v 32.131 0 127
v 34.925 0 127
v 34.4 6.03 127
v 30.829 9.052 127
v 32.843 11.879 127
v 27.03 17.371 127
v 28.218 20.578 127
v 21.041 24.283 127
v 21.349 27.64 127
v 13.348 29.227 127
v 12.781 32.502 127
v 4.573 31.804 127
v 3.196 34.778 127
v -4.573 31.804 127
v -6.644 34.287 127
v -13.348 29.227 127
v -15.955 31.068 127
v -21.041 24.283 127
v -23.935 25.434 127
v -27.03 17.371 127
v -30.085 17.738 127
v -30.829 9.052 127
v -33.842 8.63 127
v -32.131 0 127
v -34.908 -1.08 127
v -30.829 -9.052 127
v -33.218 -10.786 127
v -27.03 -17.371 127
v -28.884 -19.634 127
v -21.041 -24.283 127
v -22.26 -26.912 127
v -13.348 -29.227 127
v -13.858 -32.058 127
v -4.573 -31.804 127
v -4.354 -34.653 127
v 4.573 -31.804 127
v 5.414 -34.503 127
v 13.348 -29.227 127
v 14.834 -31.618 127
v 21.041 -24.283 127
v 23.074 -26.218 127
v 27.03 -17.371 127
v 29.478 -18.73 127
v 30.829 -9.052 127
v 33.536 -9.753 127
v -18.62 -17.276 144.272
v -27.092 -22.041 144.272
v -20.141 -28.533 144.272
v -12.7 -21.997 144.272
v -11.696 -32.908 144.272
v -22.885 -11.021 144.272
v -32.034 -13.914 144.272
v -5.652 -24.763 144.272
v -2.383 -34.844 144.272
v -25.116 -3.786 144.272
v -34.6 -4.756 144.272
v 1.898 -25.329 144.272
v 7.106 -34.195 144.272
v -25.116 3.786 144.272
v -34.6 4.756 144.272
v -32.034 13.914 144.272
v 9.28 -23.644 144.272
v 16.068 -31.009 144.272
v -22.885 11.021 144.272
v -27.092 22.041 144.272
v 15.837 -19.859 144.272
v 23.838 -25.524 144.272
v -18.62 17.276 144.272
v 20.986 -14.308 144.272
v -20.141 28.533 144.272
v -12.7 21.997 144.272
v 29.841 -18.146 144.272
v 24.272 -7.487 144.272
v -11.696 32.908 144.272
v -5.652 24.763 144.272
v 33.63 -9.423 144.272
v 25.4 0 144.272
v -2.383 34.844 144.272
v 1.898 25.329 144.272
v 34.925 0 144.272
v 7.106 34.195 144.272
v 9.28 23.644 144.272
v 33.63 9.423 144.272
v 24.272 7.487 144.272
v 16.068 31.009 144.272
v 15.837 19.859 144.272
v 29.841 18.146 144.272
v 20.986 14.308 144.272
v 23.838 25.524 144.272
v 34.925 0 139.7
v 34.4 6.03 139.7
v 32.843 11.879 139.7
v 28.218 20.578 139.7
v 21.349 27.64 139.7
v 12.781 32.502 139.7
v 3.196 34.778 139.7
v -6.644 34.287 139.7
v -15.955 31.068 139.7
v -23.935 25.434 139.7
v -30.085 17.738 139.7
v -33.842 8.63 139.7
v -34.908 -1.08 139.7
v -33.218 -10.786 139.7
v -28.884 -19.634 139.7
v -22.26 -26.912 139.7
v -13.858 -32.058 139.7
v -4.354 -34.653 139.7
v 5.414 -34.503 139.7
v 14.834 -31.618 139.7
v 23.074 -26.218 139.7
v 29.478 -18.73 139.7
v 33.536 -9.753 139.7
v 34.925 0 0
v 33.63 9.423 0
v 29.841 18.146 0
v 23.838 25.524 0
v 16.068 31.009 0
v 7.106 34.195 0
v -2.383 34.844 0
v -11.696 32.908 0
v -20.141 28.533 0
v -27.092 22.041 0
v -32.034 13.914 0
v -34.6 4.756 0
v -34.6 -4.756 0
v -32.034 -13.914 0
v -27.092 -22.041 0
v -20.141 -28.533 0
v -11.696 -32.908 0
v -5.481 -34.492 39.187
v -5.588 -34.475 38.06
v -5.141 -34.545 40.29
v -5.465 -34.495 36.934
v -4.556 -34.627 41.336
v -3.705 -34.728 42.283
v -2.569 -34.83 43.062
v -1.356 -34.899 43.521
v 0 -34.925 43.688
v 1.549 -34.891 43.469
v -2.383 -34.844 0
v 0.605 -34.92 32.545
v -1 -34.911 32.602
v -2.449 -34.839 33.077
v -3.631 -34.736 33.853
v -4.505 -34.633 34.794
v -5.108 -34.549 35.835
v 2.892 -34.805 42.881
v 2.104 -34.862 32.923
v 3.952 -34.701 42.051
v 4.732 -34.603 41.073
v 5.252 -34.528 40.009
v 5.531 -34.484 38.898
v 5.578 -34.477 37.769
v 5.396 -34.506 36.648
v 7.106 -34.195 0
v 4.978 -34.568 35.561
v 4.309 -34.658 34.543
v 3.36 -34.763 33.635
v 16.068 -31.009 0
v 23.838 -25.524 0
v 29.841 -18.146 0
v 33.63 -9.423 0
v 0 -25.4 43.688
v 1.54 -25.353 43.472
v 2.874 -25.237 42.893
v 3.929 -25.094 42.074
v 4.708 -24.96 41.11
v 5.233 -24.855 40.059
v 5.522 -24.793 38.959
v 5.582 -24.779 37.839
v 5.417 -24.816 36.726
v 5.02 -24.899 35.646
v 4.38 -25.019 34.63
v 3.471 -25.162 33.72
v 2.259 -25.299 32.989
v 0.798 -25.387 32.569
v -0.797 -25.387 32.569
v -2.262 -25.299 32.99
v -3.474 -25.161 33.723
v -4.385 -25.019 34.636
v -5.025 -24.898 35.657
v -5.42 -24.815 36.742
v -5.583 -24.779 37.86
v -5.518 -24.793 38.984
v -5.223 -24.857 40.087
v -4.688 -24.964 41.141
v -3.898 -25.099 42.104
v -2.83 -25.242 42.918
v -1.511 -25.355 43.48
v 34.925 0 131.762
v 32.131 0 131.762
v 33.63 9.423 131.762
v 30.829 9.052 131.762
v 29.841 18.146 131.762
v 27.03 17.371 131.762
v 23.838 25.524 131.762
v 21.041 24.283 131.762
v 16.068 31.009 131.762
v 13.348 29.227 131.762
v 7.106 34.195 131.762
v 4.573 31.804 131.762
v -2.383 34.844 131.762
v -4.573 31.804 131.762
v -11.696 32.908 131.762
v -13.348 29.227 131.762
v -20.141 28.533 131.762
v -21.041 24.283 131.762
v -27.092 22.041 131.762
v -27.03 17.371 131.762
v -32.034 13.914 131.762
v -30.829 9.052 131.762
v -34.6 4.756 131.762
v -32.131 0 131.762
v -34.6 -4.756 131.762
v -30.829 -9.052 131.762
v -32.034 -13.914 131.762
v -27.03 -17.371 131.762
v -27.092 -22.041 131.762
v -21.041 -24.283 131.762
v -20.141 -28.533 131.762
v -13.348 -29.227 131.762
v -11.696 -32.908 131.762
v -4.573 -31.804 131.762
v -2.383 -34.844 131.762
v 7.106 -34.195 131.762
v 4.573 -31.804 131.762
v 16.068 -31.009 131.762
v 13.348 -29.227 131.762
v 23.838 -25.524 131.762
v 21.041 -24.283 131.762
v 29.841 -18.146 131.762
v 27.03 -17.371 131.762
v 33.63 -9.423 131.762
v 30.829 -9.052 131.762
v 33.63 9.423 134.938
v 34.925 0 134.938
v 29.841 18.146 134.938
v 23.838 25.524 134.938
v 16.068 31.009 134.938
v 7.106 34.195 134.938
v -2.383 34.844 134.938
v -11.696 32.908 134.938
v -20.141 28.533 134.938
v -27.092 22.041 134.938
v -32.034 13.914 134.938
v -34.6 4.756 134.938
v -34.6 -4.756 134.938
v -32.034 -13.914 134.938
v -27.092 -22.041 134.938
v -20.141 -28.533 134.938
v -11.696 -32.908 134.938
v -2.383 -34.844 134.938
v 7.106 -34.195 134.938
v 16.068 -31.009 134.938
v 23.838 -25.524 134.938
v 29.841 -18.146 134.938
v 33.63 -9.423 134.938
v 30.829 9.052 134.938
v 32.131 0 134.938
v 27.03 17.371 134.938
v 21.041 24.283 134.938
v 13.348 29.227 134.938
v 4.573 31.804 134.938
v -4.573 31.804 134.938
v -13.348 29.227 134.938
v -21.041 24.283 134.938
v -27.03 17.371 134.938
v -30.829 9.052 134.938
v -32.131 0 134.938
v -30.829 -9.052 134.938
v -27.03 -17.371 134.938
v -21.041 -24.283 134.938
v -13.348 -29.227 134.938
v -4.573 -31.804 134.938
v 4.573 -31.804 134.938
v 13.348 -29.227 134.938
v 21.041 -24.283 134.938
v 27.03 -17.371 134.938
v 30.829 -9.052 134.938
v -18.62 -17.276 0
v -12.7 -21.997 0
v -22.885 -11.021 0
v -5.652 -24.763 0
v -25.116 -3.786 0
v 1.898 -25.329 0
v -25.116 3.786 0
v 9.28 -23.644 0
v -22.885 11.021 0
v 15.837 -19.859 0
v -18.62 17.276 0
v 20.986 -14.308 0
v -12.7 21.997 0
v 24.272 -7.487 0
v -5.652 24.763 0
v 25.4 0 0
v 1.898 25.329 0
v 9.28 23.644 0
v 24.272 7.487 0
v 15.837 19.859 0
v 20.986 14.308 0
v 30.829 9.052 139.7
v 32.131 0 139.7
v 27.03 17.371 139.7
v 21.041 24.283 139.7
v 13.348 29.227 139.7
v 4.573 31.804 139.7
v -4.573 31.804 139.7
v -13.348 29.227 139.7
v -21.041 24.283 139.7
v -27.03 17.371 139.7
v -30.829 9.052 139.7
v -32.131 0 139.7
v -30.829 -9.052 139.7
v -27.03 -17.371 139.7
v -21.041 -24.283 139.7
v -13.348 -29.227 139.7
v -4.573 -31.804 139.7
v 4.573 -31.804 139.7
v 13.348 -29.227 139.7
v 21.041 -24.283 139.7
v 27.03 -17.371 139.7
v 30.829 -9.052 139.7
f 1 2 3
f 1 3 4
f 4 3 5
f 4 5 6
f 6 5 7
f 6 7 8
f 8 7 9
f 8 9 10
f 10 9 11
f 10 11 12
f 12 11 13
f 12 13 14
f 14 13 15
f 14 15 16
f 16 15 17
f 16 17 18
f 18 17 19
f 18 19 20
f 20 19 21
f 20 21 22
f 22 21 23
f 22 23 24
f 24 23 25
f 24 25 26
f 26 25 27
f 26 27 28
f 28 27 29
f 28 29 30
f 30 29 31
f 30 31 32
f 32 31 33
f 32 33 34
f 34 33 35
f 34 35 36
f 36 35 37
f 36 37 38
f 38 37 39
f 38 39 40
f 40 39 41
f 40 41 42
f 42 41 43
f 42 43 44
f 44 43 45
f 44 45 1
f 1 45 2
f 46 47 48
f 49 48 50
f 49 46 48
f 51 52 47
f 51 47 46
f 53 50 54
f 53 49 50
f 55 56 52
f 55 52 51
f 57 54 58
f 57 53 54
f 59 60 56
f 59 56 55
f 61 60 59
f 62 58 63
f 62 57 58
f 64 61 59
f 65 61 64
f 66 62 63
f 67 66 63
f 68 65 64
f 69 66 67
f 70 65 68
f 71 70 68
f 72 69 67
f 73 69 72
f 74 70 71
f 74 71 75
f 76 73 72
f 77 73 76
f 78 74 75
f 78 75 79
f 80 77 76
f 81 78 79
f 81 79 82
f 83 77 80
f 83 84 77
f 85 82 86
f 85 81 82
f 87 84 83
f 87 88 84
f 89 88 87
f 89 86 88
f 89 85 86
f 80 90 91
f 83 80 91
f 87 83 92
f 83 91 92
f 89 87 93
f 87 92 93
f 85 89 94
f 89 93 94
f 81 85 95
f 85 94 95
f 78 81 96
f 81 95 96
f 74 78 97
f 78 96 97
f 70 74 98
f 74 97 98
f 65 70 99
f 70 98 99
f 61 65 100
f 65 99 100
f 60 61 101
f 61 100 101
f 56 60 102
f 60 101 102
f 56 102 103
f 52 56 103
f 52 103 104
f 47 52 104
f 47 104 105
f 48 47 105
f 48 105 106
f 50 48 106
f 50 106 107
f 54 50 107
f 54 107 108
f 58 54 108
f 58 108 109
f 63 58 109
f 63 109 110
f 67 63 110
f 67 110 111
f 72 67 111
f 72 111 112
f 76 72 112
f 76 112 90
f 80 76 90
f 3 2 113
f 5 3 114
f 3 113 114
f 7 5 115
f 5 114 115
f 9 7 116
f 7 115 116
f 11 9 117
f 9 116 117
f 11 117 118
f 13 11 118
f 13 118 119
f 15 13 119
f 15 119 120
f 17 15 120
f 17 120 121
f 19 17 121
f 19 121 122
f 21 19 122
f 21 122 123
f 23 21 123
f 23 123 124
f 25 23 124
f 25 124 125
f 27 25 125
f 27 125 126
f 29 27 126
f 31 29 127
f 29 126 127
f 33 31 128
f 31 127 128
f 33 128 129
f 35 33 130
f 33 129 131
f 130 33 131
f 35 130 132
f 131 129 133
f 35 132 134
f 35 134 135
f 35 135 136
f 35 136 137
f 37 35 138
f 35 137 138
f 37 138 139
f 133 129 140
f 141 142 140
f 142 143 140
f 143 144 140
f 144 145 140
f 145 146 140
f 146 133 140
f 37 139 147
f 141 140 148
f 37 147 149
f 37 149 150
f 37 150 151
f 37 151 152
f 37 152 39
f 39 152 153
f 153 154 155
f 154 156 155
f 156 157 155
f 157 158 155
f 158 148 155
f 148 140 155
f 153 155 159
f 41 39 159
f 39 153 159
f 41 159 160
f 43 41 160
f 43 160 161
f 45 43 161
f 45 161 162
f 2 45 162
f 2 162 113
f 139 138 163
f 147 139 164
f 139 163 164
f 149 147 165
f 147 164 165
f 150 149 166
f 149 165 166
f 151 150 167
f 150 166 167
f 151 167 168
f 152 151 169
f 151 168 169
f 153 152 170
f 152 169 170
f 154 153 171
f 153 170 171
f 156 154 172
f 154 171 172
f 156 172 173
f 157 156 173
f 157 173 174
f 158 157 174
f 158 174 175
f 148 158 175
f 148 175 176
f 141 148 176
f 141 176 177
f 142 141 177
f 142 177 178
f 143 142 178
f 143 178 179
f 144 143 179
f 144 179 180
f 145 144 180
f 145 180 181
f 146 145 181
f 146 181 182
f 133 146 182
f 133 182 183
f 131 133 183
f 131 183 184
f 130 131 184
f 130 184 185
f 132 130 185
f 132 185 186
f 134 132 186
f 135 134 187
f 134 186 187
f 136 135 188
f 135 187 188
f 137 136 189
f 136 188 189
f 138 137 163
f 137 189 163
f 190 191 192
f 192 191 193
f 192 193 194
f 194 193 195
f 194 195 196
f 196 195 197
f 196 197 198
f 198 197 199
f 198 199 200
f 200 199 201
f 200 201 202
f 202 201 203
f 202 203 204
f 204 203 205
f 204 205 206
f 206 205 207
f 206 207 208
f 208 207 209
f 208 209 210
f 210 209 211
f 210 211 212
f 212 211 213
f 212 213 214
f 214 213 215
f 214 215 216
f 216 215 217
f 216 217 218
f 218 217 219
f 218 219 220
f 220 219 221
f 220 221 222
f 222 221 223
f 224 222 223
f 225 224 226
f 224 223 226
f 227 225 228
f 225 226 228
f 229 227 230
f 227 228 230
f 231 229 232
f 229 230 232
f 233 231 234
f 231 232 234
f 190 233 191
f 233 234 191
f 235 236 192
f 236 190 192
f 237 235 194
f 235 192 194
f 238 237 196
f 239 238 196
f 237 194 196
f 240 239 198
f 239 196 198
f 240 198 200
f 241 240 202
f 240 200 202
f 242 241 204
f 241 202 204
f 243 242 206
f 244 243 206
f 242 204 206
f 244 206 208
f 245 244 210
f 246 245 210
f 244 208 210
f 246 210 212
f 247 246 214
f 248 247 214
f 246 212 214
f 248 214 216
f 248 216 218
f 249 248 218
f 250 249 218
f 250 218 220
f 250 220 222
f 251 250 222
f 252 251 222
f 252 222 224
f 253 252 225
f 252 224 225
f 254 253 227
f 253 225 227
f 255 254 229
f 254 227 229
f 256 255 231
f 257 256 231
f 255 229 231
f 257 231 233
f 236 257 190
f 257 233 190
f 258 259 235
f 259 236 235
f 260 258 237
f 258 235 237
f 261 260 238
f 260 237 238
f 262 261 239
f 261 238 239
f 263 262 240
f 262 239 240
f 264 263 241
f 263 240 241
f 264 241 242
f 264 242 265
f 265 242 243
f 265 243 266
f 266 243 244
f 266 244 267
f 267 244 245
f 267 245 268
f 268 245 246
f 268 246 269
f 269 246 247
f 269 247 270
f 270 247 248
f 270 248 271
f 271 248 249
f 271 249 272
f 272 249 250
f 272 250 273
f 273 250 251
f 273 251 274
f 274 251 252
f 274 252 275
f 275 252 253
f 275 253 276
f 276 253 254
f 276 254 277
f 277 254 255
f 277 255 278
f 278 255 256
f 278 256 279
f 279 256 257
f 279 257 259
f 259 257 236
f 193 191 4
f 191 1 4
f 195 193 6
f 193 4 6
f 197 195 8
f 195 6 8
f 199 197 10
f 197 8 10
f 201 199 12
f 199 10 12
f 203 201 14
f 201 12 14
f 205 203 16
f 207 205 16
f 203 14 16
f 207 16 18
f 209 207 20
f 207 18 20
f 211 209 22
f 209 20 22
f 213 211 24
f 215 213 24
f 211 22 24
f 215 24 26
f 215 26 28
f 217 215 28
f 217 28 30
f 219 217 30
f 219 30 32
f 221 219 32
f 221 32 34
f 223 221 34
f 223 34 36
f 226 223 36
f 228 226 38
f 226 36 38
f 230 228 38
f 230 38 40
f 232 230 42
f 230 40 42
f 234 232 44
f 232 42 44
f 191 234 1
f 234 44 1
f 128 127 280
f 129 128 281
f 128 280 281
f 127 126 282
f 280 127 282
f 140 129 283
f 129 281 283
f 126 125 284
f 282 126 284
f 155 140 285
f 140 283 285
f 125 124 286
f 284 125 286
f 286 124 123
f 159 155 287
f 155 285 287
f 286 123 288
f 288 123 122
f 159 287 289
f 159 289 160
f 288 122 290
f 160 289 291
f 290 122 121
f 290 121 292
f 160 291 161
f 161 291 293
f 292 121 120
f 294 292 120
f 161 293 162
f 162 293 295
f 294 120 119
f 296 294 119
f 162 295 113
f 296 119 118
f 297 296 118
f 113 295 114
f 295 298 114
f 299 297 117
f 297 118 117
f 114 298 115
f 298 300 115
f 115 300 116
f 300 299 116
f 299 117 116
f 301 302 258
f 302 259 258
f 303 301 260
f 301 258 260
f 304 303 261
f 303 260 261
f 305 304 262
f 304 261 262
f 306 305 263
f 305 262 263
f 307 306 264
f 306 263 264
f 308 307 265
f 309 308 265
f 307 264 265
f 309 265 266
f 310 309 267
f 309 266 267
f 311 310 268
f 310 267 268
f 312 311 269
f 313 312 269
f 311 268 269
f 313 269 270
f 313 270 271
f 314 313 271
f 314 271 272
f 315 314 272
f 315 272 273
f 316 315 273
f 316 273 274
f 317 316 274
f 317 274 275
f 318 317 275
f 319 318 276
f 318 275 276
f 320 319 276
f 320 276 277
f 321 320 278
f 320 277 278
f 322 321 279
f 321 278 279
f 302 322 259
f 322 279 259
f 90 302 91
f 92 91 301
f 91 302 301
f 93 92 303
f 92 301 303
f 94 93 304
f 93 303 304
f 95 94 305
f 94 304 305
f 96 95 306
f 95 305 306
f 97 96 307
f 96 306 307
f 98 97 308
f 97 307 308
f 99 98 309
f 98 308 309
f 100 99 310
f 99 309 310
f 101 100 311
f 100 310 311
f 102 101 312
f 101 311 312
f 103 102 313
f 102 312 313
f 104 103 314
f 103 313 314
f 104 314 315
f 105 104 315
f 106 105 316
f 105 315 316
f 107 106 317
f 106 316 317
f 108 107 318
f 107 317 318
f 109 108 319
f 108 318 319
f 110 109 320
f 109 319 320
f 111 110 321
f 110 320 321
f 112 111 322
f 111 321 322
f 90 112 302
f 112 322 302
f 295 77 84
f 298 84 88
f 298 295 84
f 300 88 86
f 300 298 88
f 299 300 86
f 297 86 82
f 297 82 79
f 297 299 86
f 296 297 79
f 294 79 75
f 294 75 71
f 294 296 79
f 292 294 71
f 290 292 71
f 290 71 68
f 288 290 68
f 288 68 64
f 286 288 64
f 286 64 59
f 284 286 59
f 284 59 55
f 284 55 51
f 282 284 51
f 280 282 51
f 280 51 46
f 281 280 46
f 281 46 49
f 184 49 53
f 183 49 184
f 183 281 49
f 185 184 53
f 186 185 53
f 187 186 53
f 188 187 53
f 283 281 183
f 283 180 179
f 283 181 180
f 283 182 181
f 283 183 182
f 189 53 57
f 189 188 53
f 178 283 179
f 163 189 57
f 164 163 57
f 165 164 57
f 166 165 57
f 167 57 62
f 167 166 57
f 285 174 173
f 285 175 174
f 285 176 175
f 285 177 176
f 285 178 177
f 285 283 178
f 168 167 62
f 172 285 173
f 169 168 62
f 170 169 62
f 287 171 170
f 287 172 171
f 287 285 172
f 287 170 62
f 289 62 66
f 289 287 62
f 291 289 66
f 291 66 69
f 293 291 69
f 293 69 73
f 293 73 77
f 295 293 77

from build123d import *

# Parameters (mm, degrees)
SKETCH1_R               = 34.925
SKETCH1_R_2             = 25.4
BOSS_EXTRUDE1_DEPTH     = 144.272
CUT_EXTRUDE1_REACH      = 154.492
CUT_EXTRUDE1_END_RADIUS = 34.925
SKETCH2_R               = 5.588


with BuildPart() as part:
    # Sketch1 → Boss-Extrude1 (new body)
    with BuildSketch(Plane.XY):
        Circle(SKETCH1_R)
        Circle(SKETCH1_R_2, mode=Mode.SUBTRACT)
    extrude(amount=BOSS_EXTRUDE1_DEPTH)

    # Cut-Extrude1: up to this cylinder (the profile starts inside it)
    cut_extrude1_end = Plane(origin=(0, 0, 38.1), z_dir=(0, 0, -1)) * Cylinder(CUT_EXTRUDE1_END_RADIUS, 379.834, mode=Mode.PRIVATE)
    # Sketch2 → Cut-Extrude1 (cut, up to the surface)
    with BuildSketch(Plane(origin=(0, 0, 0), x_dir=(1, 0, 0), z_dir=(0, 1, 0)), mode=Mode.PRIVATE) as cut_extrude1_sk1:
        with Locations(Location((0, -38.1, 0), (0, 0, 270))):
            Circle(SKETCH2_R)
    cut_extrude1_tool1 = extrude(cut_extrude1_sk1.sketch, amount=-CUT_EXTRUDE1_REACH, mode=Mode.PRIVATE) & cut_extrude1_end
    add(cut_extrude1_tool1.solids().sort_by_distance((0, 0, 38.1))[0], mode=Mode.SUBTRACT)

    # Cut-Sweep1: sweep along a path in groove path
    with BuildLine(Plane.XY.offset(131.7625)) as cut_sweep1_path:
        CenterArc((0, 0), 34.925, 0, 360)
    # groove → Cut-Sweep1 (sweep, cut)
    with BuildSketch(Plane(origin=(0, 0, 0), x_dir=(0, 0, -1), z_dir=(1, 0, 0))):
        Polygon((-139.7, 34.925), (-139.7, 32.131), (-134.9375, 32.131), (-134.9375, 34.925), (-131.7625, 34.925), (-131.7625, 32.131), (-127, 32.131), (-127, 34.925), (-127, 38.1), (-139.7, 38.1), align=None)
    sweep(path=cut_sweep1_path.line, mode=Mode.SUBTRACT)


solid = part.part
